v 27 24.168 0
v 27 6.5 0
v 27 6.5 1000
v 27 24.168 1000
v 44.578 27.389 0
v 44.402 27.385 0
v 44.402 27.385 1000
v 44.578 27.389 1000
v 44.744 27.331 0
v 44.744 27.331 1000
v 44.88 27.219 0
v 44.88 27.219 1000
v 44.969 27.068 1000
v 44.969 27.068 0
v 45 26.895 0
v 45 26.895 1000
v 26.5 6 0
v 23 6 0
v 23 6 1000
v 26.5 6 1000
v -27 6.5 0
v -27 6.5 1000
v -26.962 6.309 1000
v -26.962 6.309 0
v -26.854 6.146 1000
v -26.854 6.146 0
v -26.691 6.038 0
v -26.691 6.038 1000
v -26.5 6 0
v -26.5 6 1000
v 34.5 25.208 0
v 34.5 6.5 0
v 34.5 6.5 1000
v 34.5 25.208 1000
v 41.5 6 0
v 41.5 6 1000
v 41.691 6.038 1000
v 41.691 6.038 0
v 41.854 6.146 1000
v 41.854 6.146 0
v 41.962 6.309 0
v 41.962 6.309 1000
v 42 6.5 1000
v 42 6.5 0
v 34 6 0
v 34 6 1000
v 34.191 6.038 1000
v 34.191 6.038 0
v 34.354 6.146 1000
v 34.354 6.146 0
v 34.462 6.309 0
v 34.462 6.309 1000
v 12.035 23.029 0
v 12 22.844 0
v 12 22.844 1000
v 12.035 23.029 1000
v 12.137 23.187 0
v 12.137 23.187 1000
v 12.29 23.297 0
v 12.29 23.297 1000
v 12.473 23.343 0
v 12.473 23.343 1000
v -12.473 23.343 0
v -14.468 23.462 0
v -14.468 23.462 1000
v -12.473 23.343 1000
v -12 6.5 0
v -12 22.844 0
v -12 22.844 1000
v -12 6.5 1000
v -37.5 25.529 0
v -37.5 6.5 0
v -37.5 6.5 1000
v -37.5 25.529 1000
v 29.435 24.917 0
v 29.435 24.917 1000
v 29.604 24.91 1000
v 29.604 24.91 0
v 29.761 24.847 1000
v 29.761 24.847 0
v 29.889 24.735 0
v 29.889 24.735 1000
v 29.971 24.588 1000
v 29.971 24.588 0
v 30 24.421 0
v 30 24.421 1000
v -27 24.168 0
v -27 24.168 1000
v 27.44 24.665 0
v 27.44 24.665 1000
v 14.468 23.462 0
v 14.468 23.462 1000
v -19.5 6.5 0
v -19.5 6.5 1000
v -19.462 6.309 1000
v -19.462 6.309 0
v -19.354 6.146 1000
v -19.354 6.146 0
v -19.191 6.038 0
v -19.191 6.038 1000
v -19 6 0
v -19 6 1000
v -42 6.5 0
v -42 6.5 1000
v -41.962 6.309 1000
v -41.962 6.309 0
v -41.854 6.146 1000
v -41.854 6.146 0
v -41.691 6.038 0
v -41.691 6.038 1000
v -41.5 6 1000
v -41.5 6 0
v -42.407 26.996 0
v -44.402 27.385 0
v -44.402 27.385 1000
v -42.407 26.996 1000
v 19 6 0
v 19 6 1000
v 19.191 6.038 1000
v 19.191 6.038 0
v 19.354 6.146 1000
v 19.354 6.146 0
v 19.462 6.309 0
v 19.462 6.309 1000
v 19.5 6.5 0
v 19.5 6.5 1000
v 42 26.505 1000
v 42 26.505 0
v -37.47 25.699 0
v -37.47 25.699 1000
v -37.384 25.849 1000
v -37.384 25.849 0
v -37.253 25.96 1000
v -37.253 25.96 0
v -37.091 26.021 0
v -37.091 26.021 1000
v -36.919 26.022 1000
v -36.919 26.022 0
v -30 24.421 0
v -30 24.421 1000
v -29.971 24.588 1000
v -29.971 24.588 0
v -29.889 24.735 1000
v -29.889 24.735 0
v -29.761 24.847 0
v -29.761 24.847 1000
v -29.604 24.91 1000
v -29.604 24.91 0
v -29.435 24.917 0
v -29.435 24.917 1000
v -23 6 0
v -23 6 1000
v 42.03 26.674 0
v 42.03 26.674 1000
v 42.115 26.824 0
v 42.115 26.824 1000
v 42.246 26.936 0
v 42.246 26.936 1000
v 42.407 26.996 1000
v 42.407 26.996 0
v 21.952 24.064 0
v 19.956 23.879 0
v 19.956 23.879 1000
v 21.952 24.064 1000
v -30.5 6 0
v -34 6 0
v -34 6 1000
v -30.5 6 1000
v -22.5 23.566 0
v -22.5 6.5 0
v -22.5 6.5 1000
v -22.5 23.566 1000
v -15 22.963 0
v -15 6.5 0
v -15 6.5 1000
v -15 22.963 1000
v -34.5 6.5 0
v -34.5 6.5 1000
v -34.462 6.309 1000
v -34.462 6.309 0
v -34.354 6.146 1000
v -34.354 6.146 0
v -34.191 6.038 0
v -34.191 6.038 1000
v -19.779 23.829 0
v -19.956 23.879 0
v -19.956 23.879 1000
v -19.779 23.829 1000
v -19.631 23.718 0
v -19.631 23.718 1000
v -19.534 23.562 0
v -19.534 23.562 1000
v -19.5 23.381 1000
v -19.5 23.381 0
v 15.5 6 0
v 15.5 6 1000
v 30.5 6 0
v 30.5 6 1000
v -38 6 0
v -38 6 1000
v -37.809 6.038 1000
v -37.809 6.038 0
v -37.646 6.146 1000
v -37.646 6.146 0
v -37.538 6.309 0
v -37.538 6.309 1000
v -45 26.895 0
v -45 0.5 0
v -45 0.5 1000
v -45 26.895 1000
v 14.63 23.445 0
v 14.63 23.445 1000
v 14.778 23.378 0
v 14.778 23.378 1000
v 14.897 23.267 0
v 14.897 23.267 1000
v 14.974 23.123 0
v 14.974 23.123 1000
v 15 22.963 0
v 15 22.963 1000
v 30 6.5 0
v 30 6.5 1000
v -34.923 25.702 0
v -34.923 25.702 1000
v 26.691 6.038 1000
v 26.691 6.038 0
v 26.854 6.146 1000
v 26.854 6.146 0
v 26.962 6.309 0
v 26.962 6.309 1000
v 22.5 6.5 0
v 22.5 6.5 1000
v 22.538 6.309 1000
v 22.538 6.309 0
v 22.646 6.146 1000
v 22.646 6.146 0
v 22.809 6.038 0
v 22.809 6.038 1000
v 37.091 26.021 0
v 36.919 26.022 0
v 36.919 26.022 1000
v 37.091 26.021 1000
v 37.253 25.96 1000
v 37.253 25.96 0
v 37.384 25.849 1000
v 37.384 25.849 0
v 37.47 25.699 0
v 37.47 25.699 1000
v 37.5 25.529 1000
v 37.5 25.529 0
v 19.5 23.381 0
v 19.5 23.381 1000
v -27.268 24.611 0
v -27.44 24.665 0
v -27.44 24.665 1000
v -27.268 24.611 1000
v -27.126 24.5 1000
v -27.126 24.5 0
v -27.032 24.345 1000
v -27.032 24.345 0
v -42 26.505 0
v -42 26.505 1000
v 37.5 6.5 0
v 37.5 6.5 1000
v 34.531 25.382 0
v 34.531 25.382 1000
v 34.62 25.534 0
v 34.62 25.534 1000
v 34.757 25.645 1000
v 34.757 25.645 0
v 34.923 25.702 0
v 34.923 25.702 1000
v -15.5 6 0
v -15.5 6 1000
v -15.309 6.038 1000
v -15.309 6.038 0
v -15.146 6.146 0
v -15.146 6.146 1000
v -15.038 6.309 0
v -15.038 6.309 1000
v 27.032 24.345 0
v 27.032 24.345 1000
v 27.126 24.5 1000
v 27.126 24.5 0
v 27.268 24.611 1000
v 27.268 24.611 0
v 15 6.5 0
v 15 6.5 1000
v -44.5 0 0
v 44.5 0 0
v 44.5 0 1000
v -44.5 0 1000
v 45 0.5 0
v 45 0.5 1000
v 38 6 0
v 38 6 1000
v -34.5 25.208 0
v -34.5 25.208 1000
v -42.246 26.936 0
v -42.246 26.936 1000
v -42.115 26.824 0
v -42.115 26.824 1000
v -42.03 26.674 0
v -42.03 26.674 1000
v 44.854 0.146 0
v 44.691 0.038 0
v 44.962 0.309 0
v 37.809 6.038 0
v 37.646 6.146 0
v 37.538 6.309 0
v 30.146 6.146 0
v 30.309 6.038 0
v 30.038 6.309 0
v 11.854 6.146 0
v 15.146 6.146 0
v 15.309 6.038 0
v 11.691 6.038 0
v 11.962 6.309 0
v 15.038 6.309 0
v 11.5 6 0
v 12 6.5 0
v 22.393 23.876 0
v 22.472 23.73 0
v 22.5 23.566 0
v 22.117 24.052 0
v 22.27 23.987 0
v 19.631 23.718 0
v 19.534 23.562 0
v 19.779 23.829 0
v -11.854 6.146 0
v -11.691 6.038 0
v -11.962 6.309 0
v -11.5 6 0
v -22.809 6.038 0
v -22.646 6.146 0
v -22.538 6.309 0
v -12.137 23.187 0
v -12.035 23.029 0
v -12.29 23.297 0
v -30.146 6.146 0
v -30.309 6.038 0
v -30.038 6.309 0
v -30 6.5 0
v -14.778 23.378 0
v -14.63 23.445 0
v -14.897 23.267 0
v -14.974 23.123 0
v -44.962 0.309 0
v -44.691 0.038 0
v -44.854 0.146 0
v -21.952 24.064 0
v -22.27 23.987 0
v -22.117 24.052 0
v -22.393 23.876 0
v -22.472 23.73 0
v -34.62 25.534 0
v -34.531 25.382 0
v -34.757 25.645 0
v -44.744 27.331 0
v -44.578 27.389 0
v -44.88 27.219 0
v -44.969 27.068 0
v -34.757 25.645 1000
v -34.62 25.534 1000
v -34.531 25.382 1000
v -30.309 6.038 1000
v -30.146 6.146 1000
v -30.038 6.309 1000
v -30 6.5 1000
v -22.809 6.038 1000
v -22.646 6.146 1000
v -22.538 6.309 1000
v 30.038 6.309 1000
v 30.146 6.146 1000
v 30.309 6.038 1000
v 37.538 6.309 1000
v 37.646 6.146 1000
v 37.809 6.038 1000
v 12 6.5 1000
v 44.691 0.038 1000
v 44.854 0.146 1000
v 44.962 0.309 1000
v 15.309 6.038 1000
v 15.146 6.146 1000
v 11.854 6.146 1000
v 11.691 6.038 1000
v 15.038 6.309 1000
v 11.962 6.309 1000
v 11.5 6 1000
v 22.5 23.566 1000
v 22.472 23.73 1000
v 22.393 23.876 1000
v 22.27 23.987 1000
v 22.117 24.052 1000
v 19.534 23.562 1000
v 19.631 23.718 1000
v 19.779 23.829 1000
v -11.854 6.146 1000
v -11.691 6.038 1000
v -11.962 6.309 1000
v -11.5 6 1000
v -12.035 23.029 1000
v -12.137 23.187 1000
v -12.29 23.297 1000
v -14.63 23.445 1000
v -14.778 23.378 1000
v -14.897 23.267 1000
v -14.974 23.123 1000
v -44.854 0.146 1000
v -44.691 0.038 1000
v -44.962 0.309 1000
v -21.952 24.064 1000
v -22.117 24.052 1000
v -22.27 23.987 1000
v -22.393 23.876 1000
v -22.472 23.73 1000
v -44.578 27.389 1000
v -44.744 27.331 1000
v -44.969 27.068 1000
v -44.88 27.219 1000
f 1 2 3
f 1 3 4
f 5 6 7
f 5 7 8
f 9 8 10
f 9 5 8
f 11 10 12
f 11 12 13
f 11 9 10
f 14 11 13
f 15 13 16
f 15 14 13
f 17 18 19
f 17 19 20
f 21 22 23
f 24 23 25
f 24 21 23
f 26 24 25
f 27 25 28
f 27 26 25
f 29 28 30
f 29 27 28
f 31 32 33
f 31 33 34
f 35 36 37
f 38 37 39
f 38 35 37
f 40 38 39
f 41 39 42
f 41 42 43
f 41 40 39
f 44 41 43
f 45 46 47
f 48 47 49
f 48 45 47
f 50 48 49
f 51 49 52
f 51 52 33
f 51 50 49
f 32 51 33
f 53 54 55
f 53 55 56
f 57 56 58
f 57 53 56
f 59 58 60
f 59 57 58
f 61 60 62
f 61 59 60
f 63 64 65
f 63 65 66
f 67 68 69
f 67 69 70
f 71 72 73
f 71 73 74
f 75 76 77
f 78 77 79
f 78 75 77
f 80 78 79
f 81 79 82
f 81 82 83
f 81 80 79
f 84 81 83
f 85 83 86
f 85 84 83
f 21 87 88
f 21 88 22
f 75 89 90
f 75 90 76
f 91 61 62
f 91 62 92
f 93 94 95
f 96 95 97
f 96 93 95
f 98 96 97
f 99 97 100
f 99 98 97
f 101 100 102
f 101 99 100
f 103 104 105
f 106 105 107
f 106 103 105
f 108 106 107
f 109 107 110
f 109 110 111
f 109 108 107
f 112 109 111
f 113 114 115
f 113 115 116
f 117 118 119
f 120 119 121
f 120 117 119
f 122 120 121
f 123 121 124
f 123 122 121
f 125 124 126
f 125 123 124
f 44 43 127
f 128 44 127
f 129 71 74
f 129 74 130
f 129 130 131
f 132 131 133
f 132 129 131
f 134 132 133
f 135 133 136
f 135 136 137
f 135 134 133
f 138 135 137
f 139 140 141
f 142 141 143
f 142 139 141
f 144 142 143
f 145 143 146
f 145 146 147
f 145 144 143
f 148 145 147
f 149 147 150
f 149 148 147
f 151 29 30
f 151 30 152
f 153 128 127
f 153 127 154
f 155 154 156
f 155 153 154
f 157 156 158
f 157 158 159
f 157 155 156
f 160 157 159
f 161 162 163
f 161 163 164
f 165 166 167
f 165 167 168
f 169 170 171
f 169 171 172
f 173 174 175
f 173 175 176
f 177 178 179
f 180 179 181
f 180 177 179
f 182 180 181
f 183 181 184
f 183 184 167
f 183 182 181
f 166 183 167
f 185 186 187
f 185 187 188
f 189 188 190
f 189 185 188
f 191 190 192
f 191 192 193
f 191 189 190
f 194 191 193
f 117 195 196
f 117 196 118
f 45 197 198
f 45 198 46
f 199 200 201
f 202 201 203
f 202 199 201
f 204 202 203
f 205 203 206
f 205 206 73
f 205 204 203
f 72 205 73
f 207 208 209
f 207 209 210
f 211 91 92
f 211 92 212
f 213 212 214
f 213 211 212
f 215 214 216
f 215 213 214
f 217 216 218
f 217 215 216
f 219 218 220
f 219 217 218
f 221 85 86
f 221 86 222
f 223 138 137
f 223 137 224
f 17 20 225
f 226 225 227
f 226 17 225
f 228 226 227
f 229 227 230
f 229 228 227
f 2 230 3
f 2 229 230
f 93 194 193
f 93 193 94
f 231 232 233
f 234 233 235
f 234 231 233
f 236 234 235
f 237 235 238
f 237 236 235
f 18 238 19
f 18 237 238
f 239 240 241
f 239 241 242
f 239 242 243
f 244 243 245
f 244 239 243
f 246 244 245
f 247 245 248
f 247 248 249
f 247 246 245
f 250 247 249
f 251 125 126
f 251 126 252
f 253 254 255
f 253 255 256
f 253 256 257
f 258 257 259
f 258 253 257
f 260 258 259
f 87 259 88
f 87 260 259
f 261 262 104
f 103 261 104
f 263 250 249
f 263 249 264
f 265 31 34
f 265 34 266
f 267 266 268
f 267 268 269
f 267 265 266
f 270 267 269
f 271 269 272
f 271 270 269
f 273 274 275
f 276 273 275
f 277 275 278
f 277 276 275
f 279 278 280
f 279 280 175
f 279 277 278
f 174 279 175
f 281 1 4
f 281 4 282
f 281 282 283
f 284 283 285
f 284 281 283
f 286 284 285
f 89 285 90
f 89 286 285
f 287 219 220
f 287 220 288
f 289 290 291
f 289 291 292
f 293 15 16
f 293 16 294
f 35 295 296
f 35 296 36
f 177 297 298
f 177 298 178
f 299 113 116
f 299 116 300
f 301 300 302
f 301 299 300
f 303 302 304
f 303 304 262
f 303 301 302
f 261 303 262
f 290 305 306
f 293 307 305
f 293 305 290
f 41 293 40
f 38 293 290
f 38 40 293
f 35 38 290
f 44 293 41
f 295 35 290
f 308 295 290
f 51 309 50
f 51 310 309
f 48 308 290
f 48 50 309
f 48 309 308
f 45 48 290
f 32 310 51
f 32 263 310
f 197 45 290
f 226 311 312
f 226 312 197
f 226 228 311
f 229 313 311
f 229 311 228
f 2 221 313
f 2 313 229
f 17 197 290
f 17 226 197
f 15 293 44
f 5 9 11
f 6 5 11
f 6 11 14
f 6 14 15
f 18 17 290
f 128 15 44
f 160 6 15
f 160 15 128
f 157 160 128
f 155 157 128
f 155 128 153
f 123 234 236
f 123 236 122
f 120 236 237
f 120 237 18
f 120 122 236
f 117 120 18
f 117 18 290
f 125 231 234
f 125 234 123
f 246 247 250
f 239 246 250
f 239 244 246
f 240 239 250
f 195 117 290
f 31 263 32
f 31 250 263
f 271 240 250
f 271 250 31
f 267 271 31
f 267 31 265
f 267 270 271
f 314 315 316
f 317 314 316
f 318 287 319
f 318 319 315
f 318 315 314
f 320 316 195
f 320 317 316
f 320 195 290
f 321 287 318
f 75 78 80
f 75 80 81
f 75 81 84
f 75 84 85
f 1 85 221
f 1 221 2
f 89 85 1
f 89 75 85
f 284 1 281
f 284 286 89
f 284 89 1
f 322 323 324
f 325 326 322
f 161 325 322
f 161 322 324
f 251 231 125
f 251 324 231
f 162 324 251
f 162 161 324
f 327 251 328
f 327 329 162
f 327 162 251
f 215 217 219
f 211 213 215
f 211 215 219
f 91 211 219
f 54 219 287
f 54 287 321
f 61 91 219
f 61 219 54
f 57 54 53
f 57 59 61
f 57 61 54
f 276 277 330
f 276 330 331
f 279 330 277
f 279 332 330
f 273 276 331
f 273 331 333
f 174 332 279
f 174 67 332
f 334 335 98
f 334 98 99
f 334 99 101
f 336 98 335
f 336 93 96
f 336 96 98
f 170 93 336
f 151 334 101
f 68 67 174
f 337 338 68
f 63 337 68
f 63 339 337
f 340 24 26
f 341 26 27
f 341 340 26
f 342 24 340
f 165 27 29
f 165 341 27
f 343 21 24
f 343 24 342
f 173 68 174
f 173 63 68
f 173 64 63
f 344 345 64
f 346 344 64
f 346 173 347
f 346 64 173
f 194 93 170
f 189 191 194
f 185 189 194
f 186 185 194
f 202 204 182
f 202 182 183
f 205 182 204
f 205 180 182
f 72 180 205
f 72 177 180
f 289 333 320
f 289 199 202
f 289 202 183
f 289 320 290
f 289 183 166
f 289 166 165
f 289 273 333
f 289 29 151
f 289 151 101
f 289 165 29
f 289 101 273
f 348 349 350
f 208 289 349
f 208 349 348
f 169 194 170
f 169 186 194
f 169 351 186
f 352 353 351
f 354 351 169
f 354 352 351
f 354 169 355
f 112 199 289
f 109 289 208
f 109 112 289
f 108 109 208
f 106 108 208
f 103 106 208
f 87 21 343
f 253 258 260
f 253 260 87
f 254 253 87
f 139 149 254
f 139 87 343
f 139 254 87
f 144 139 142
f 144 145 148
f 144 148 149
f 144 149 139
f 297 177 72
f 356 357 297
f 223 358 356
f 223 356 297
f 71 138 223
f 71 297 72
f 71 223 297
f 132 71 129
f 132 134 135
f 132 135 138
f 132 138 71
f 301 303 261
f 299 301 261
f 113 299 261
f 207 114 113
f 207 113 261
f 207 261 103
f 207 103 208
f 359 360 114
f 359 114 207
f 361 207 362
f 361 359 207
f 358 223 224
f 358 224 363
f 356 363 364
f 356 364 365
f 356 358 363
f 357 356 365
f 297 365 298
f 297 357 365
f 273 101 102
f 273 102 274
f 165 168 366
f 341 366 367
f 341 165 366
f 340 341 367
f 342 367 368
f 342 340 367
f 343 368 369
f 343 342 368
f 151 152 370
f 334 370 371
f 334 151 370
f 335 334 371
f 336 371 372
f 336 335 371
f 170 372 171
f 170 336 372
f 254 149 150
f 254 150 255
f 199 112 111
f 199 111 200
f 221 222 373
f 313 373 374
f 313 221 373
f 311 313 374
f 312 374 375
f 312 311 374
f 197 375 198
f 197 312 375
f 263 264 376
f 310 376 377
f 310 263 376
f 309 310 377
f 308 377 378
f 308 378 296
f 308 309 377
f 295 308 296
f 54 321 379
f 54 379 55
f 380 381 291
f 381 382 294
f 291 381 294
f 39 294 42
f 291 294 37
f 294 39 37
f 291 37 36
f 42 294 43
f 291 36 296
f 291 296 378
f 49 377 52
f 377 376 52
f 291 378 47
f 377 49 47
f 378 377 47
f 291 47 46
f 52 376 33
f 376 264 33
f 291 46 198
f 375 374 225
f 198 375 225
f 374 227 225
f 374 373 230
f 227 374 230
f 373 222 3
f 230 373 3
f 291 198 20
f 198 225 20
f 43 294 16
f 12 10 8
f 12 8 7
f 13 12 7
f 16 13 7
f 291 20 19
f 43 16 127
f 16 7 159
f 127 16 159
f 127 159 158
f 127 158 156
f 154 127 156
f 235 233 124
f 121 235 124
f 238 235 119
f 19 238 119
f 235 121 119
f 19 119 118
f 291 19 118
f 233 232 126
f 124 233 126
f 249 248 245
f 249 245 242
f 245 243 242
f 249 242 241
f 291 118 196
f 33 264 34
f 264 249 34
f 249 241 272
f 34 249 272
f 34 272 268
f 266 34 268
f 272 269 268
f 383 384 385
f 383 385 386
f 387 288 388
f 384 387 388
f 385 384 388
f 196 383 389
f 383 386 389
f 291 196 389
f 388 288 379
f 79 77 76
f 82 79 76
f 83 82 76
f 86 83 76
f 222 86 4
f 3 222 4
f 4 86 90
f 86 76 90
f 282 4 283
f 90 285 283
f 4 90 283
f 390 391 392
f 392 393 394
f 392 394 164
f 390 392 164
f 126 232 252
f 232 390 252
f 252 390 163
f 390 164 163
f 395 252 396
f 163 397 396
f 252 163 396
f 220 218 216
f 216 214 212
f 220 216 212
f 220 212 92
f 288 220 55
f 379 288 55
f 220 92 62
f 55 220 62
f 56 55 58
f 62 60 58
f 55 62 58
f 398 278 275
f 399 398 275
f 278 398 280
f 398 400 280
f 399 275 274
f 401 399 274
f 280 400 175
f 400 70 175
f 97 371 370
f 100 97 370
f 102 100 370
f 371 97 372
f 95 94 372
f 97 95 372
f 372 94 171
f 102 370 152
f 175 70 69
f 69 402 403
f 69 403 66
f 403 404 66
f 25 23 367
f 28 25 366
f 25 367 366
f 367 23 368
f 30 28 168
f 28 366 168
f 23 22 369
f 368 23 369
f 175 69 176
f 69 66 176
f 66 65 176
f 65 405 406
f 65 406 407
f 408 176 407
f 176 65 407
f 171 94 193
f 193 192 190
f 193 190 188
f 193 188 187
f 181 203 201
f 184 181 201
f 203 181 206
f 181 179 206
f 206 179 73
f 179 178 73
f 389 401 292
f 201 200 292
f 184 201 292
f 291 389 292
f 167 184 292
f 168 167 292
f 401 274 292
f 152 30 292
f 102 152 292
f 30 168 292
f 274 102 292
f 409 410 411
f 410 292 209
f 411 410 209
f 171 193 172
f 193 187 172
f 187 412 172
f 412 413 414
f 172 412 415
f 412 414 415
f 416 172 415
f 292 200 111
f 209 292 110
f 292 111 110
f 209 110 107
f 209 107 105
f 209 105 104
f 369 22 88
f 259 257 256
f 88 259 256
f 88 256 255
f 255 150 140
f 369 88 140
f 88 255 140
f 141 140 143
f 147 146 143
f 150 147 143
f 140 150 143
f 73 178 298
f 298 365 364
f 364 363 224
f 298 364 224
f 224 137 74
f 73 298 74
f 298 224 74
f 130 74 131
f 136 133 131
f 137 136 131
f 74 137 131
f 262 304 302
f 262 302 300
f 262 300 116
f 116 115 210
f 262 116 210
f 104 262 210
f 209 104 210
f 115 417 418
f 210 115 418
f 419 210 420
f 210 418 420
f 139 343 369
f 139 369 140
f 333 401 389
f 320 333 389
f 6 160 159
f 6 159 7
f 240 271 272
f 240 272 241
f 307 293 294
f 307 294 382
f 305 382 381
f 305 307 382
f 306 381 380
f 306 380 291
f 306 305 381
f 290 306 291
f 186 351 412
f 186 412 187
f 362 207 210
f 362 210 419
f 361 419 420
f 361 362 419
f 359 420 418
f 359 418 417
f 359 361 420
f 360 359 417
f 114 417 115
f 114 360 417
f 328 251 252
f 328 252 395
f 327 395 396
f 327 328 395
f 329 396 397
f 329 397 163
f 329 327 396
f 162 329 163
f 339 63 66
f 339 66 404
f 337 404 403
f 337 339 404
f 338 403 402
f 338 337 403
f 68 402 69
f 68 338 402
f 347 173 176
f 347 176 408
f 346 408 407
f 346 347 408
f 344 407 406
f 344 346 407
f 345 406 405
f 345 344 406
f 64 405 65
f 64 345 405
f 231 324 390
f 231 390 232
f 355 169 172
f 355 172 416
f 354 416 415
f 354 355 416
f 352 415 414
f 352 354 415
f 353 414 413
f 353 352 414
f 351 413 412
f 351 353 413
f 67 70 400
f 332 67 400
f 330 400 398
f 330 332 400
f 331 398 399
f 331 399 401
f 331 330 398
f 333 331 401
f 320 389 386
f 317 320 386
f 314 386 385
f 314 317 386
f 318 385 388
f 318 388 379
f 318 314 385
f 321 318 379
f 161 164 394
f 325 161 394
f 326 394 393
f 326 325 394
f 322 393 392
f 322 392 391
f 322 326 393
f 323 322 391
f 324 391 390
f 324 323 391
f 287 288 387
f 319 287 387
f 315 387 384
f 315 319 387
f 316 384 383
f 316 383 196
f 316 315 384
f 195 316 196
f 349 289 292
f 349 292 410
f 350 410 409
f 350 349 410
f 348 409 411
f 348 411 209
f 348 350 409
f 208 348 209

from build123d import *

# Parameters (mm, degrees)
EXTRUDE_1_DEPTH = 1000


with BuildPart() as part:
    # Model → Бобышка-Вытянуть1 (new body)
    with BuildSketch(Plane.XY):
        with BuildLine():
            Line((-45, 0.5), (-45, 26.894643722))
            ThreePointArc((-45, 26.894643722), (-44.817095334, 27.281232068), (-44.402197802, 27.384985164))
            Line((-44.402197802, 27.384985164), (-42.406593407, 26.996231342))
            ThreePointArc((-42.406593407, 26.996231342), (-42.114835557, 26.823857), (-42, 26.505033614))
            Line((-42, 26.505033614), (-42, 6.5))
            ThreePointArc((-42, 6.5), (-41.853553391, 6.146446609), (-41.5, 6))
            Line((-41.5, 6), (-38, 6))
            ThreePointArc((-38, 6), (-37.646446609, 6.146446609), (-37.5, 6.5))
            Line((-37.5, 6.5), (-37.5, 25.528955097))
            ThreePointArc((-37.5, 25.528955097), (-37.323527943, 25.910176385), (-36.918681319, 26.022298052))
            Line((-36.918681319, 26.022298052), (-34.923076923, 25.70247728))
            ThreePointArc((-34.923076923, 25.70247728), (-34.620222737, 25.533651691), (-34.5, 25.208429873))
            Line((-34.5, 25.208429873), (-34.5, 6.5))
            ThreePointArc((-34.5, 6.5), (-34.353553391, 6.146446609), (-34, 6))
            Line((-34, 6), (-30.5, 6))
            ThreePointArc((-30.5, 6), (-30.146446609, 6.146446609), (-30, 6.5))
            Line((-30, 6.5), (-30, 24.420745635))
            ThreePointArc((-30, 24.420745635), (-29.829835124, 24.796523217), (-29.435164835, 24.916524216))
            Line((-29.435164835, 24.916524216), (-27.43956044, 24.664537804))
            ThreePointArc((-27.43956044, 24.664537804), (-27.125687443, 24.499700959), (-27, 24.168204187))
            Line((-27, 24.168204187), (-27, 6.5))
            ThreePointArc((-27, 6.5), (-26.853553391, 6.146446609), (-26.5, 6))
            Line((-26.5, 6), (-23, 6))
            ThreePointArc((-23, 6), (-22.646446609, 6.146446609), (-22.5, 6.5))
            Line((-22.5, 6.5), (-22.5, 23.56623485))
            ThreePointArc((-22.5, 23.56623485), (-22.336023939, 23.936488698), (-21.951648352, 24.063891477))
            Line((-21.951648352, 24.063891477), (-19.956043956, 23.878890172))
            ThreePointArc((-19.956043956, 23.878890172), (-19.631233121, 23.718481187), (-19.5, 23.380826054))
            Line((-19.5, 23.380826054), (-19.5, 6.5))
            ThreePointArc((-19.5, 6.5), (-19.353553391, 6.146446609), (-19, 6))
            Line((-19, 6), (-15.5, 6))
            ThreePointArc((-15.5, 6), (-15.146446609, 6.146446609), (-15, 6.5))
            Line((-15, 6.5), (-15, 22.962558154))
            ThreePointArc((-15, 22.962558154), (-14.842100814, 23.327204603), (-14.468131868, 23.461541543))
            Line((-14.468131868, 23.461541543), (-12.472527473, 23.342910858))
            ThreePointArc((-12.472527473, 23.342910858), (-12.13686348, 23.187369337), (-12, 22.843666168))
            Line((-12, 22.843666168), (-12, 6.5))
            ThreePointArc((-12, 6.5), (-11.853553391, 6.146446609), (-11.5, 6))
            Line((-11.5, 6), (11.5, 6))
            ThreePointArc((11.5, 6), (11.853553391, 6.146446609), (12, 6.5))
            Line((12, 6.5), (12, 22.843666168))
            ThreePointArc((12, 22.843666168), (12.13686348, 23.187369337), (12.472527473, 23.342910858))
            Line((12.472527473, 23.342910858), (14.468131868, 23.461541543))
            ThreePointArc((14.468131868, 23.461541543), (14.842100814, 23.327204603), (15, 22.962558154))
            Line((15, 22.962558154), (15, 6.5))
            ThreePointArc((15, 6.5), (15.146446609, 6.146446609), (15.5, 6))
            Line((15.5, 6), (19, 6))
            ThreePointArc((19, 6), (19.353553391, 6.146446609), (19.5, 6.5))
            Line((19.5, 6.5), (19.5, 23.380826054))
            ThreePointArc((19.5, 23.380826054), (19.631233121, 23.718481187), (19.956043956, 23.878890172))
            Line((19.956043956, 23.878890172), (21.951648352, 24.063891477))
            ThreePointArc((21.951648352, 24.063891477), (22.336023939, 23.936488698), (22.5, 23.56623485))
            Line((22.5, 23.56623485), (22.5, 6.5))
            ThreePointArc((22.5, 6.5), (22.646446609, 6.146446609), (23, 6))
            Line((23, 6), (26.5, 6))
            ThreePointArc((26.5, 6), (26.853553391, 6.146446609), (27, 6.5))
            Line((27, 6.5), (27, 24.168204187))
            ThreePointArc((27, 24.168204187), (27.125687443, 24.499700959), (27.43956044, 24.664537804))
            Line((27.43956044, 24.664537804), (29.435164835, 24.916524216))
            ThreePointArc((29.435164835, 24.916524216), (29.829835124, 24.796523217), (30, 24.420745635))
            Line((30, 24.420745635), (30, 6.5))
            ThreePointArc((30, 6.5), (30.146446609, 6.146446609), (30.5, 6))
            Line((30.5, 6), (34, 6))
            ThreePointArc((34, 6), (34.353553391, 6.146446609), (34.5, 6.5))
            Line((34.5, 6.5), (34.5, 25.208429873))
            ThreePointArc((34.5, 25.208429873), (34.620222737, 25.533651691), (34.923076923, 25.70247728))
            Line((34.923076923, 25.70247728), (36.918681319, 26.022298052))
            ThreePointArc((36.918681319, 26.022298052), (37.323527943, 25.910176385), (37.5, 25.528955097))
            Line((37.5, 25.528955097), (37.5, 6.5))
            ThreePointArc((37.5, 6.5), (37.646446609, 6.146446609), (38, 6))
            Line((38, 6), (41.5, 6))
            ThreePointArc((41.5, 6), (41.853553391, 6.146446609), (42, 6.5))
            Line((42, 6.5), (42, 26.505033614))
            ThreePointArc((42, 26.505033614), (42.114835557, 26.823857), (42.406593407, 26.996231342))
            Line((42.406593407, 26.996231342), (44.402197802, 27.384985164))
            ThreePointArc((44.402197802, 27.384985164), (44.817095334, 27.281232068), (45, 26.894643722))
            Line((45, 26.894643722), (45, 0.5))
            ThreePointArc((45, 0.5), (44.853553391, 0.146446609), (44.5, 0))
            Line((44.5, 0), (-44.5, 0))
            ThreePointArc((-44.5, 0), (-44.853553391, 0.146446609), (-45, 0.5))
        make_face()
    extrude(amount=EXTRUDE_1_DEPTH)


solid = part.part
